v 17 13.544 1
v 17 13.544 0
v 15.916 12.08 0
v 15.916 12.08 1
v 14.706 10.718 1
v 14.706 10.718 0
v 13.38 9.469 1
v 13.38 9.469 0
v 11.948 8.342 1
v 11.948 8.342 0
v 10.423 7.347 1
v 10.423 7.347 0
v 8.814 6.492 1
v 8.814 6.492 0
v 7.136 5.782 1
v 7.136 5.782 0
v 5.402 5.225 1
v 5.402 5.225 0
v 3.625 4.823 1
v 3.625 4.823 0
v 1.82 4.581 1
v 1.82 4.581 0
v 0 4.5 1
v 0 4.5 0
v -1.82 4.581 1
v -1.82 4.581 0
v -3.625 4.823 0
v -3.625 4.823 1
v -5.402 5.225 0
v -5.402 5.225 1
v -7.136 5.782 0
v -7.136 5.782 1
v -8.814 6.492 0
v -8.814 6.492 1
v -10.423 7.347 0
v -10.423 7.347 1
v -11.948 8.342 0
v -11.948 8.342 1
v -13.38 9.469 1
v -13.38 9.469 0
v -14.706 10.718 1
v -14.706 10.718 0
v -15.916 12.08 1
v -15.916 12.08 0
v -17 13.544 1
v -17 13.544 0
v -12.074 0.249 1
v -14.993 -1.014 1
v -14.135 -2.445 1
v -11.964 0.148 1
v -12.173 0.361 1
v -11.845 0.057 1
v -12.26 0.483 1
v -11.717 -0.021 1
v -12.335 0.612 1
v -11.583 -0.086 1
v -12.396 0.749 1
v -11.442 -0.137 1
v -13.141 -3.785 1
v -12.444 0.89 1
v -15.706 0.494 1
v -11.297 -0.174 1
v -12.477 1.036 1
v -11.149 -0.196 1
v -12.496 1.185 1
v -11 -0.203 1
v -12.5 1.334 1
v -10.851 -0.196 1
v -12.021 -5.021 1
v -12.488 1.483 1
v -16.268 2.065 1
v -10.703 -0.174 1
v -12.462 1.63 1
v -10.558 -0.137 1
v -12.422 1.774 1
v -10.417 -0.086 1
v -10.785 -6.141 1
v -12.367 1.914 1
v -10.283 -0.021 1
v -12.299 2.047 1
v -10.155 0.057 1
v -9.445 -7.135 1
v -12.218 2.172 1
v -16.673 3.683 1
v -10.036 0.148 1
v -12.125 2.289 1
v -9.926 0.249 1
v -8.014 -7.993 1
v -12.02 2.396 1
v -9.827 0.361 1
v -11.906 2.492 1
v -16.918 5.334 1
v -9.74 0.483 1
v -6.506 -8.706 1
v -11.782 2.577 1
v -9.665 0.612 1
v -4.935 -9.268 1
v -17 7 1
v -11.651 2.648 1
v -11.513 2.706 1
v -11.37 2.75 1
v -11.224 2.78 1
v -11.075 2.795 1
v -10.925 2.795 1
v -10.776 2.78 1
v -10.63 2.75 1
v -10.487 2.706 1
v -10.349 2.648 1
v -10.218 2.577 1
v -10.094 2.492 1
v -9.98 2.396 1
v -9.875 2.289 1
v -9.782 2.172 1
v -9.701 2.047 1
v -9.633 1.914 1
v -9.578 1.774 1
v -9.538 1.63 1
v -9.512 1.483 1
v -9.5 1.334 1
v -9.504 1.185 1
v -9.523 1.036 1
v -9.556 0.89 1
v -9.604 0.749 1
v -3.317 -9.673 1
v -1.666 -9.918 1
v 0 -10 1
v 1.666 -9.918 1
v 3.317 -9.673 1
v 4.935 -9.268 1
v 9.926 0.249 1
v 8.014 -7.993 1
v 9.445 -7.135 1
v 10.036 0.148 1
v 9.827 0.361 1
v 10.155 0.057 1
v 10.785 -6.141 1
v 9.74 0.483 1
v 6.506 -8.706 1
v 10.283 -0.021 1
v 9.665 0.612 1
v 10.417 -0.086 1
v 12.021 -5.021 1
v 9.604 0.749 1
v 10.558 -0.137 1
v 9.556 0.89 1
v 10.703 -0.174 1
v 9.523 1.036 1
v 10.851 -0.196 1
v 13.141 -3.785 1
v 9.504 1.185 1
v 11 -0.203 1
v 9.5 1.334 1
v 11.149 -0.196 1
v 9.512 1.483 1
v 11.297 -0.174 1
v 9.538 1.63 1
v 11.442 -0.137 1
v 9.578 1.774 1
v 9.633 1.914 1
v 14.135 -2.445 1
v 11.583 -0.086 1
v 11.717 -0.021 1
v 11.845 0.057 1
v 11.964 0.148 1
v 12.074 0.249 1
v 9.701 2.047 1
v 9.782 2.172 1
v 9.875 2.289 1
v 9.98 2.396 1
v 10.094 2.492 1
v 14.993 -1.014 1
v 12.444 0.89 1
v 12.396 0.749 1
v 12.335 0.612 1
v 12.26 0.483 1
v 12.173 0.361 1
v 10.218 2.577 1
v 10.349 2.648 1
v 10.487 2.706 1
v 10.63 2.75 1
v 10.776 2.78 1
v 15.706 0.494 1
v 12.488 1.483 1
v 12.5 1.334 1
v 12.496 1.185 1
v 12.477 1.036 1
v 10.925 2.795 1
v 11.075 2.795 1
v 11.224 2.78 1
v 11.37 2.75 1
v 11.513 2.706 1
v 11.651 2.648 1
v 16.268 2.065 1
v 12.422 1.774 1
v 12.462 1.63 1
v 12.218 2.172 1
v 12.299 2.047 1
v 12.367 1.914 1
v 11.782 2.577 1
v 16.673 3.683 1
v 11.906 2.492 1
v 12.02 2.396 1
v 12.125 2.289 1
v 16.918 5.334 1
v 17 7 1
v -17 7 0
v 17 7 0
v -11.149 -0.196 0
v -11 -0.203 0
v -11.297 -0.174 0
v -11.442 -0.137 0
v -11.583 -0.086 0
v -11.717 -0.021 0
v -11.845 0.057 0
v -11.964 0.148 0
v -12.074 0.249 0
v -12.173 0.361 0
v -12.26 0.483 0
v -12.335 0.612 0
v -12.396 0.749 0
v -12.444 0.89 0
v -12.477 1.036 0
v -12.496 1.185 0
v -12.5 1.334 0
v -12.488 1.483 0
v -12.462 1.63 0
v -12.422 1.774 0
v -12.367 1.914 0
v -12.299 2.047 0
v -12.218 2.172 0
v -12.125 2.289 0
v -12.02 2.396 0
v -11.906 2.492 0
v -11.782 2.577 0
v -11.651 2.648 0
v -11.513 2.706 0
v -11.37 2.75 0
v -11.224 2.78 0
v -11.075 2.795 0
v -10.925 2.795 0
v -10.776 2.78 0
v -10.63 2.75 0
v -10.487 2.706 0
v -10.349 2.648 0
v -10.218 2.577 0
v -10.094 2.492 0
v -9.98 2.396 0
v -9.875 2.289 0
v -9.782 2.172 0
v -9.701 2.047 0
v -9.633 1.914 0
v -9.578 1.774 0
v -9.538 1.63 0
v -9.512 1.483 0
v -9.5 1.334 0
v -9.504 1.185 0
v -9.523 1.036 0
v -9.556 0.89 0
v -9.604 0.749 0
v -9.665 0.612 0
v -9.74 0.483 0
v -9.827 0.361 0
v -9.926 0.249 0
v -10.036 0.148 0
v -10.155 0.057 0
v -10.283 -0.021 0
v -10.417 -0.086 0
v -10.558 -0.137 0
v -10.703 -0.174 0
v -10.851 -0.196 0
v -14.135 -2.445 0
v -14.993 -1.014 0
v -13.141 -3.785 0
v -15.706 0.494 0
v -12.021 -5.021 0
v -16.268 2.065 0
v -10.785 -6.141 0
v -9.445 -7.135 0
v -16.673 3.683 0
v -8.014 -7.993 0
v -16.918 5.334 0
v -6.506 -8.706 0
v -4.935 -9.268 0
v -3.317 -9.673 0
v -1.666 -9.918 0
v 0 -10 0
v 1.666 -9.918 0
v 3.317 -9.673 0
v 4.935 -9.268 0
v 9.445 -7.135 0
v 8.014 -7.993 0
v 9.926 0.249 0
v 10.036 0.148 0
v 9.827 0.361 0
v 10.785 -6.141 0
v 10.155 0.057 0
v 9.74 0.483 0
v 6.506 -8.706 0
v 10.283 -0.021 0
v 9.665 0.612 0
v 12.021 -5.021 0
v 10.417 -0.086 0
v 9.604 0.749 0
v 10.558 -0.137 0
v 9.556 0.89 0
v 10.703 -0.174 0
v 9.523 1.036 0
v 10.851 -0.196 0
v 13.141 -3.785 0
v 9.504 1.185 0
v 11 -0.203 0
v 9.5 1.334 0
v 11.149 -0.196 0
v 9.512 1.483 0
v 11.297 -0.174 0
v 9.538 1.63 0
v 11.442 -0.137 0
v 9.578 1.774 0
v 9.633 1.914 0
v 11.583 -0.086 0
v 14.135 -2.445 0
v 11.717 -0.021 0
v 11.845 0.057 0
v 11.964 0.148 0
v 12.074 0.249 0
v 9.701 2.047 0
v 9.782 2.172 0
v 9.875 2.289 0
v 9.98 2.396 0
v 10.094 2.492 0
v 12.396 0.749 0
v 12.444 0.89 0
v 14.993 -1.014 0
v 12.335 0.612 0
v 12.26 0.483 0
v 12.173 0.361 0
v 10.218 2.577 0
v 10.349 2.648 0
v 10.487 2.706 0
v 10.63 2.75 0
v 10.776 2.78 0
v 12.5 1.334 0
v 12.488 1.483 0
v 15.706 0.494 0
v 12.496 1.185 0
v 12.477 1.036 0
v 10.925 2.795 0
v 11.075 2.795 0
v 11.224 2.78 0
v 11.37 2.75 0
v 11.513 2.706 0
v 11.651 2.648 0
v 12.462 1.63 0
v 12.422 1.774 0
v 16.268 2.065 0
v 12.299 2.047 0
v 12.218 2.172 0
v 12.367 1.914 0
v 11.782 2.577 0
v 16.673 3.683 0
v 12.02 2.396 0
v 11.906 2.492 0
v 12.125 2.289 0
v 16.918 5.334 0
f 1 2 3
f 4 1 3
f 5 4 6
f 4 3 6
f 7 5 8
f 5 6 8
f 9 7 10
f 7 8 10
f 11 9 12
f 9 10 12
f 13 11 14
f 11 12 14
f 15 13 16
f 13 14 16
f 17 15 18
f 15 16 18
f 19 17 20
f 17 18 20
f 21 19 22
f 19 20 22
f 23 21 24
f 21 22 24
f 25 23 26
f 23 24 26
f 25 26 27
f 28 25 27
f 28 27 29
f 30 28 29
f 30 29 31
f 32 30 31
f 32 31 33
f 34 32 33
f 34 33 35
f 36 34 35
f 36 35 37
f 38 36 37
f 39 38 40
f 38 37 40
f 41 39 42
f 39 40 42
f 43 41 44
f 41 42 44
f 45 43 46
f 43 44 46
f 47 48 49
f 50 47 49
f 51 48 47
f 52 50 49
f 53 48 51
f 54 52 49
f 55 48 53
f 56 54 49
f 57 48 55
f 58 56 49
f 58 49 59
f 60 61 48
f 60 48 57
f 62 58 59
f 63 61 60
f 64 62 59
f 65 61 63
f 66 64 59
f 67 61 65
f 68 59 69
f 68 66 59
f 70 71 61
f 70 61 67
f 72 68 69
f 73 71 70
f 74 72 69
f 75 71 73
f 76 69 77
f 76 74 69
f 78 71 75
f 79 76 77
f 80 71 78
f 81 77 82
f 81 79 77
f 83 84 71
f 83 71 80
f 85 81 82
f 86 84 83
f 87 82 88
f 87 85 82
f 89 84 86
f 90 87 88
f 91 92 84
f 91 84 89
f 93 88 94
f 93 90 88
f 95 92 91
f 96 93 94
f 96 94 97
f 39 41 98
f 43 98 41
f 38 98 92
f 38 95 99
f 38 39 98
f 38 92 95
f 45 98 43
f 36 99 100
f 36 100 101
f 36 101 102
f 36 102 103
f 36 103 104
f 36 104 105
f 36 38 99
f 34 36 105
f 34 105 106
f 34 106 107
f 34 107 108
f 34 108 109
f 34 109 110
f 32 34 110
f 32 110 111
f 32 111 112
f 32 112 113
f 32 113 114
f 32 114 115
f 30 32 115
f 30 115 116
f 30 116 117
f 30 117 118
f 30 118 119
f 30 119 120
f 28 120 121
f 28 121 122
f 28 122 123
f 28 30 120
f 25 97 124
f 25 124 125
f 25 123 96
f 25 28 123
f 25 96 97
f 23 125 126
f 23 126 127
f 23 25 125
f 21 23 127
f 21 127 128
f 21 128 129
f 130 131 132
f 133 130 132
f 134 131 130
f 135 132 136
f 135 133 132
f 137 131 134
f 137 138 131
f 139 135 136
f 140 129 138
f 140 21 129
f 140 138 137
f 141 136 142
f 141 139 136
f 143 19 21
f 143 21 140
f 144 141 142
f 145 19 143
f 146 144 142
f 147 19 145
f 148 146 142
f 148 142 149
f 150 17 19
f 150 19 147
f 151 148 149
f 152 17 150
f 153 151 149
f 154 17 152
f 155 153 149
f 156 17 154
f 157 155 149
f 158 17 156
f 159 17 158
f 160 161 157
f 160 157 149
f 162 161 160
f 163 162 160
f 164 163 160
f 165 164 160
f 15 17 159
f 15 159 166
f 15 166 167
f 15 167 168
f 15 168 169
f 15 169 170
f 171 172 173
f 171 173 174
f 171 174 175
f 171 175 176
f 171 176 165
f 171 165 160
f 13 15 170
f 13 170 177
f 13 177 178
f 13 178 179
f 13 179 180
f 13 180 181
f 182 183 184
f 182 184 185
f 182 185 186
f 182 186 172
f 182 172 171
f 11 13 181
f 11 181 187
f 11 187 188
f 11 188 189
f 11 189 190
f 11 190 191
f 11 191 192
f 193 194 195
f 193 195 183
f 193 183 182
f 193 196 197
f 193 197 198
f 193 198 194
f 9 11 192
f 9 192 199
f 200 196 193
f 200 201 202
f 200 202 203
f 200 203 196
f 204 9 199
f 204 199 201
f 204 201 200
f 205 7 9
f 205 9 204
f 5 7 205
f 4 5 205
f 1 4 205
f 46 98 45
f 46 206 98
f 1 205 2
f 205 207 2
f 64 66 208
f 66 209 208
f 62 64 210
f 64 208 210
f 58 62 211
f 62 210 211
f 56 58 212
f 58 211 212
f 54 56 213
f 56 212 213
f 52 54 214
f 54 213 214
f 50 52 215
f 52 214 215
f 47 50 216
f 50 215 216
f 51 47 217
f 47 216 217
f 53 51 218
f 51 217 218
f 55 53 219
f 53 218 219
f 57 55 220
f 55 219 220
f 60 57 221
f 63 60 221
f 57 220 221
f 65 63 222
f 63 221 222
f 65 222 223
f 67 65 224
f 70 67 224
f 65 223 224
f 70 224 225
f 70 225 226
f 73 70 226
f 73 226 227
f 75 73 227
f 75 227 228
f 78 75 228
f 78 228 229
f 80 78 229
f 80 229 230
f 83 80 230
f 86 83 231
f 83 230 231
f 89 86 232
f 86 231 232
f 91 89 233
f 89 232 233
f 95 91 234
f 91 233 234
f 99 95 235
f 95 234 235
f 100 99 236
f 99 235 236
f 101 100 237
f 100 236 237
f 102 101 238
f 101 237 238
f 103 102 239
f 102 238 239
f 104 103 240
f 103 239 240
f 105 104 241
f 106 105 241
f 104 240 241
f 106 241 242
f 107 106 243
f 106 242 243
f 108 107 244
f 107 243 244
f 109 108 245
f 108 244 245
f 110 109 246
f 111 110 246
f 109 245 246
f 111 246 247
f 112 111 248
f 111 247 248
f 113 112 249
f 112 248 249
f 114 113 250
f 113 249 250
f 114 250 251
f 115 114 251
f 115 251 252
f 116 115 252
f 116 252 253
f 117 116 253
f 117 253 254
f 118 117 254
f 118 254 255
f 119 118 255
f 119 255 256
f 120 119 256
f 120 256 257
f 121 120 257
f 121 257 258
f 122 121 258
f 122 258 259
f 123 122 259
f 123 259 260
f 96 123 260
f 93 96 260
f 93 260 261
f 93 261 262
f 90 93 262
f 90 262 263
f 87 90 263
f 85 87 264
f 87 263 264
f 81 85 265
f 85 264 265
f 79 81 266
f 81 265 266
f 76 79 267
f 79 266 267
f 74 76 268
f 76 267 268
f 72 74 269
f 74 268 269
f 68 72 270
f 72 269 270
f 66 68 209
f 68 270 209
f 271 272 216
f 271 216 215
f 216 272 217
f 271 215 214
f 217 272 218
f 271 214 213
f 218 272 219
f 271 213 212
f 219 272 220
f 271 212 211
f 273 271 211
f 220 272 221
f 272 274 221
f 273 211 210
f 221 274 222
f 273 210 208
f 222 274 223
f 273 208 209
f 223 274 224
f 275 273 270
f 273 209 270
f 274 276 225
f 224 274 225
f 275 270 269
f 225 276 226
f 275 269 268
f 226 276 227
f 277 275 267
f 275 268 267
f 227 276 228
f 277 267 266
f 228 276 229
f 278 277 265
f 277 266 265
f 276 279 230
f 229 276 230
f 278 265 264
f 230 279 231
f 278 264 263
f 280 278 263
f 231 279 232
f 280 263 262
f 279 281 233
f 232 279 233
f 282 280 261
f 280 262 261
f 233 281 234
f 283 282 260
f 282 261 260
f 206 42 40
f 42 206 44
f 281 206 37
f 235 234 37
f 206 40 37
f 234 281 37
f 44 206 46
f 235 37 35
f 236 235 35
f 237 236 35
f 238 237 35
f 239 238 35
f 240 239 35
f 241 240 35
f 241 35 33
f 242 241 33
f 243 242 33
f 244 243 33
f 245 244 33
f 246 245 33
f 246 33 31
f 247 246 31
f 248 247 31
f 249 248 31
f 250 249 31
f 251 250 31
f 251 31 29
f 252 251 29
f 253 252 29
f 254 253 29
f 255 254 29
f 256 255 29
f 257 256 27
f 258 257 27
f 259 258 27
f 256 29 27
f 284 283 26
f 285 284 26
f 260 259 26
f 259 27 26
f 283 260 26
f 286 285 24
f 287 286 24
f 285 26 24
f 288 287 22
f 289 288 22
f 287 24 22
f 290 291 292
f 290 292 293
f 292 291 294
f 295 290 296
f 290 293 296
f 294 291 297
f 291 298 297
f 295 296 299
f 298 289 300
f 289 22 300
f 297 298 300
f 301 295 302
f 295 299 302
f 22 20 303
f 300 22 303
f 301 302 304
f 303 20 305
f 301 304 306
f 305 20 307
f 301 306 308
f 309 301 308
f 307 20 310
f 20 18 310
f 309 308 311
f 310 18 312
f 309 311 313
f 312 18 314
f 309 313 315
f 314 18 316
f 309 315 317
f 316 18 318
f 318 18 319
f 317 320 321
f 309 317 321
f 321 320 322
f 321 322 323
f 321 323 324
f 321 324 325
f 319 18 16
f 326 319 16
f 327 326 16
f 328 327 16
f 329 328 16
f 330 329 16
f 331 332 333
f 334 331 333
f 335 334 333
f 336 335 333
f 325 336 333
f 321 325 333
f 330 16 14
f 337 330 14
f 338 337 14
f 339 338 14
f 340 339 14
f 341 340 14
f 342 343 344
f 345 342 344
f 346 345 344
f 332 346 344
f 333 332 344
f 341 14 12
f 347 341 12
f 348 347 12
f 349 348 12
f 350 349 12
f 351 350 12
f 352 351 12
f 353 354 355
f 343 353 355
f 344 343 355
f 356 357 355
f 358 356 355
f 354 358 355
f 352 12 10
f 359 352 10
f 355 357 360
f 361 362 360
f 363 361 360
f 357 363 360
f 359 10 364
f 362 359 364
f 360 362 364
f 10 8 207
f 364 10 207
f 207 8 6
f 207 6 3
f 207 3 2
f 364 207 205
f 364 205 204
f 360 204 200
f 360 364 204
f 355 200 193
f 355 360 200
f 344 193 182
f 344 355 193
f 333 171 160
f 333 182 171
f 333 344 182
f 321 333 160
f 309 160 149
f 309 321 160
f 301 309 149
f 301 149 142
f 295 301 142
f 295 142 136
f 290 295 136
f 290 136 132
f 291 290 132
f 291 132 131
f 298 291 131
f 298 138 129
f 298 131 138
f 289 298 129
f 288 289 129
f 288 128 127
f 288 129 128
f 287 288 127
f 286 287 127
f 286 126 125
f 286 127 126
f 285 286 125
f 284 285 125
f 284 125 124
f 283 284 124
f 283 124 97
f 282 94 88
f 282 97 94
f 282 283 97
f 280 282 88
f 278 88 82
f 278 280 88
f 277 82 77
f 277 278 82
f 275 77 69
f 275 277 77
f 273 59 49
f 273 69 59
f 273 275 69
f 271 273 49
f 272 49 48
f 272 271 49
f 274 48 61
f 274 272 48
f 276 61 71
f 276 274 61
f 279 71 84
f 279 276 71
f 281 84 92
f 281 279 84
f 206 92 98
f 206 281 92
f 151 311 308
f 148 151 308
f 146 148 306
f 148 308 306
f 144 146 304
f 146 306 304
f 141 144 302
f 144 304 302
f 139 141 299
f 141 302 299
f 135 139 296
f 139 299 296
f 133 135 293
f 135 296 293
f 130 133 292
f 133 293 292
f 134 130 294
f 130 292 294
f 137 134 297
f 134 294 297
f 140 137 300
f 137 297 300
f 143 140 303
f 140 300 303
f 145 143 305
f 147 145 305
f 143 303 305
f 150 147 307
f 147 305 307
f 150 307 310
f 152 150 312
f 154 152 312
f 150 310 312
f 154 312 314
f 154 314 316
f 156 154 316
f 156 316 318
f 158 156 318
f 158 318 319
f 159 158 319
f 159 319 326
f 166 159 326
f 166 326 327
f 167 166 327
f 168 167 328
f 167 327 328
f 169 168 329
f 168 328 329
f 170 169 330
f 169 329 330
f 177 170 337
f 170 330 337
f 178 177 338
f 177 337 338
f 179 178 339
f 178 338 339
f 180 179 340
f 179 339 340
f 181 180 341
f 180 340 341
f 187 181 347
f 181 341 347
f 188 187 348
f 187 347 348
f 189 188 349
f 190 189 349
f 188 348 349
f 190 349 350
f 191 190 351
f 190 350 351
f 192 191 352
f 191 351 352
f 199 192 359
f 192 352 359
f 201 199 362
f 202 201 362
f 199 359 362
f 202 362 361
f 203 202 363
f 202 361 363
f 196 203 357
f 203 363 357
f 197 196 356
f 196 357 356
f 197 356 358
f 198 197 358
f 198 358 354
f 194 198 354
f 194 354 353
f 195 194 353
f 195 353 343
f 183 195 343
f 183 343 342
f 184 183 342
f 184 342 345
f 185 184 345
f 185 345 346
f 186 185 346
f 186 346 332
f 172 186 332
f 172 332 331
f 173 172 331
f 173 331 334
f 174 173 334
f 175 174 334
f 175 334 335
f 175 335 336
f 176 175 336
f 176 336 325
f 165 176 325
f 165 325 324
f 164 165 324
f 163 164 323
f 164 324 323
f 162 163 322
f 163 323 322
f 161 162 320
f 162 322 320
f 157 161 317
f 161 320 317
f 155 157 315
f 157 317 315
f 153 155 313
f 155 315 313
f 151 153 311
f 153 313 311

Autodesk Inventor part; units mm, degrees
ref_plane "YZ Plane" through (0, 0, 0) normal (1, 0, 0) x (0, 1, 0)
ref_plane "XZ Plane" through (0, 0, 0) normal (0, 1, 0) x (-1, 0, 0)
ref_plane "XY Plane" through (0, 0, 0) normal (0, 0, 1) x (1, 0, 0)
sketch "Skizze1" plane through (0, 0, 0) normal (0, 0, 1) x (1, 0, 0)
  circle A0 centre (0, 25) radius 18.5 construction
  circle A1 centre (11, 1.2967) radius 1.5 construction
  circle A2 centre (-11, 1.2967) radius 1.5 construction
  circle A3 centre (0, 0) radius 5.5 construction
  arc A4 (-13.7171, 6) -> (-17.4753, 0.6301) centre (-13.7171, 2) ccw construction
  arc A5 (-17.4753, 0.6301) -> (17.4753, 0.6301) centre (0, 7) ccw construction
  arc A6 (17.4753, 0.6301) -> (13.7171, 6) centre (13.7171, 2) ccw construction
  line L0 (-13.7171, 6) -> (13.7171, 6) construction
  arc A7 (-15.4919, -4) -> (15.4919, -4) centre (0, 7) ccw construction
  arc A8 (-13.2288, 2.1205) -> (13.2288, 2.1205) centre (0, 7) ccw construction
  line L1 (-13.2288, 2.1205) -> (-13.2288, 18) construction
  line L2 (13.2288, 18) -> (-13.2288, 18) construction
  arc A9 (-19, 7) -> (-9.4721, -9.4705) centre (0, 7) ccw construction
  line L3 (-9.4721, -9.4705) -> (-9.4721, -18.6052) construction
  spline S0 degree 3 poles (-9.4721, -18.6052) (-10.8029, -18.1851) (-12.1032, -17.6649) (-16.3725, -15.5421) (-18.9977, -13.5189) (-21.2475, -11.0387) knots -1.506344 -1.506344 -1.506344 -1.506344 -1.083379 -1.083379 -0.074726 -0.074726 -0.074726 -0.074726 construction
  spline S1 degree 3 poles (-21.2475, -11.0387) (-21.4119, -10.8574) (-21.5695, -10.6702) (-21.8699, -10.2854) (-22.0126, -10.0879) (-22.148, -9.8855) knots -0.146464 -0.146464 -0.146464 -0.146464 -0.073068 -0.073068 0 0 0 0 construction
  spline S2 degree 3 poles (-22.148, -9.8855) (-24.4473, -6.4457) (-26.1085, -2.5959) (-28.9023, 6.7167) (-29.697, 12.4269) (-30, 18) knots -2.91726 -2.91726 -2.91726 -2.91726 -1.674385 -1.674385 0 0 0 0 construction
  line L4 (-30, 18) -> (-19, 18) construction
  line L5 (-19, 18) -> (-19, 7) construction
  line L6 (19, 18) -> (30, 18) construction
  spline S3 degree 3 poles (30, 18) (29.697, 12.4269) (28.9023, 6.7167) (26.1085, -2.5959) (24.4473, -6.4457) (22.148, -9.8855) knots -2.986913 -2.986913 -2.986913 -2.986913 -1.313902 -1.313902 -0.072047 -0.072047 -0.072047 -0.072047 construction
  spline S4 degree 3 poles (22.148, -9.8855) (22.0126, -10.0879) (21.8699, -10.2854) (21.5695, -10.6702) (21.4119, -10.8574) (21.2475, -11.0387) knots -0.146464 -0.146464 -0.146464 -0.146464 -0.073396 -0.073396 0 0 0 0 construction
  spline S5 degree 3 poles (21.2475, -11.0387) (19.6253, -12.8271) (17.7977, -14.3889) (13.7909, -16.9377) (11.6878, -17.9058) (9.4721, -18.6052) knots -3.300626 -3.300626 -3.300626 -3.300626 -3.030289 -3.030289 -2.770214 -2.770214 -2.770214 -2.770214 construction
  line L7 (9.4721, -18.6052) -> (9.4721, -9.4705) construction
  arc A10 (9.4721, -9.4705) -> (19, 7) centre (0, 7) ccw construction
  line L8 (19, 7) -> (19, 18) construction
  spline S6 degree 3 poles (21.2475, 47.0387) (21.4119, 46.8574) (21.5695, 46.6702) (21.8699, 46.2854) (22.0126, 46.0879) (22.148, 45.8855) knots -0.146464 -0.146464 -0.146464 -0.146464 -0.073068 -0.073068 0 0 0 0 construction
  spline S7 degree 3 poles (22.148, 45.8855) (24.4473, 42.4457) (26.1085, 38.5959) (28.9023, 29.2833) (29.697, 23.5731) (30, 18) knots -2.91726 -2.91726 -2.91726 -2.91726 -1.674385 -1.674385 0 0 0 0 construction
  line L9 (30, 18) -> (19, 18) construction
  line L10 (19, 18) -> (19, 29) construction
  arc A11 (19, 29) -> (9.4721, 45.4705) centre (0, 29) ccw construction
  line L11 (9.4721, 45.4705) -> (9.4721, 54.6052) construction
  spline S8 degree 3 poles (9.4721, 54.6052) (10.8029, 54.1851) (12.1032, 53.6649) (16.3725, 51.5421) (18.9977, 49.5189) (21.2475, 47.0387) knots -1.506344 -1.506344 -1.506344 -1.506344 -1.083379 -1.083379 -0.074726 -0.074726 -0.074726 -0.074726 construction
  spline S9 degree 3 poles (-22.148, 45.8855) (-22.0126, 46.0879) (-21.8699, 46.2854) (-21.5695, 46.6702) (-21.4119, 46.8574) (-21.2475, 47.0387) knots -0.146464 -0.146464 -0.146464 -0.146464 -0.073396 -0.073396 0 0 0 0 construction
  spline S10 degree 3 poles (-21.2475, 47.0387) (-19.6253, 48.8271) (-17.7977, 50.3889) (-13.7909, 52.9377) (-11.6878, 53.9058) (-9.4721, 54.6052) knots -3.300626 -3.300626 -3.300626 -3.300626 -3.030289 -3.030289 -2.770214 -2.770214 -2.770214 -2.770214 construction
  line L12 (-9.4721, 54.6052) -> (-9.4721, 45.4705) construction
  arc A12 (-9.4721, 45.4705) -> (-19, 29) centre (0, 29) ccw construction
  line L13 (-19, 29) -> (-19, 18) construction
  line L14 (-19, 18) -> (-30, 18) construction
  spline S11 degree 3 poles (-30, 18) (-29.697, 23.5731) (-28.9023, 29.2833) (-26.1085, 38.5959) (-24.4473, 42.4457) (-22.148, 45.8855) knots -2.986913 -2.986913 -2.986913 -2.986913 -1.313902 -1.313902 -0.072047 -0.072047 -0.072047 -0.072047 construction
  arc A13 (-17, 7) -> (17, 7) centre (0, 7) ccw
  arc A14 (-17, 13.5436) -> (17, 13.5436) centre (0, 25) ccw
  line L15 (17, 7) -> (17, 13.5436)
  line L16 (-17, 7) -> (-17, 13.5436)
  line L17 (0, 29) -> (0, 0) construction
  arc A15 (-13.8612, -2.8421) -> (13.8612, -2.8421) centre (0, 7) ccw construction
  circle A16 centre (0, 25) radius 20.5 construction
  line L18 (13.2288, 2.1205) -> (13.2288, 18) projected
  point P0 (0, 0)
  dimension "d2" = 2
  dimension "d3" = 2
extrude "Extrusion1" add sketch "Skizze1" along normal blind 1
sketch "Skizze2" plane through (0, 0, 1) normal (0, 0, 1) x (1, 0, 0)
  arc A0 (-17, 7) -> (17, 7) centre (0, 7) ccw projected
  line L0 (17, 7) -> (17, 13.5436) projected
  arc A1 (-17, 13.5436) -> (17, 13.5436) centre (0, 25) ccw projected
  line L1 (-17, 13.5436) -> (-17, 7) projected
  line L2 (17, 13.5436) -> (-17, 13.5436) construction
  line L3 (-17, 13.5436) -> (-17, -10) construction
  line L4 (-17, -10) -> (17, -10) construction
  line L5 (17, -10) -> (17, 13.5436) construction
  circle A2 centre (0, 25) radius 20.5 construction
  line L6 (-17, 13.5436) -> (17, 36.4564) construction
  line L7 (17, 13.5436) -> (17, 36.4564) construction
  point P0 (0, 0)
  point P1 (11, 1.2967)
  point P2 (0, 0)
  point P3 (-11, 1.2967)
  dimension "d6" = 6
  dimension "d7" = 17
  dimension "d8" = 28
  dimension "d9" = 12.2469
  dimension "d10" = 13.5436
  dimension "d11" = 23.5436
  dimension "d12" = 34
  dimension "d13" = 9.0436
  dimension "d14" = 6.5436
  dimension "d15" = 11.4564
  dimension "d16" = 20.5
  dimension "d17" = 17
  dimension "d18" = 22.9129
hole "Bohrung1" at (11, 1.2967, 1) at (-11, 1.2967, 1) direction (0, 0, -1) diameter 3 end through all
properties part number "minimalEncoder"
